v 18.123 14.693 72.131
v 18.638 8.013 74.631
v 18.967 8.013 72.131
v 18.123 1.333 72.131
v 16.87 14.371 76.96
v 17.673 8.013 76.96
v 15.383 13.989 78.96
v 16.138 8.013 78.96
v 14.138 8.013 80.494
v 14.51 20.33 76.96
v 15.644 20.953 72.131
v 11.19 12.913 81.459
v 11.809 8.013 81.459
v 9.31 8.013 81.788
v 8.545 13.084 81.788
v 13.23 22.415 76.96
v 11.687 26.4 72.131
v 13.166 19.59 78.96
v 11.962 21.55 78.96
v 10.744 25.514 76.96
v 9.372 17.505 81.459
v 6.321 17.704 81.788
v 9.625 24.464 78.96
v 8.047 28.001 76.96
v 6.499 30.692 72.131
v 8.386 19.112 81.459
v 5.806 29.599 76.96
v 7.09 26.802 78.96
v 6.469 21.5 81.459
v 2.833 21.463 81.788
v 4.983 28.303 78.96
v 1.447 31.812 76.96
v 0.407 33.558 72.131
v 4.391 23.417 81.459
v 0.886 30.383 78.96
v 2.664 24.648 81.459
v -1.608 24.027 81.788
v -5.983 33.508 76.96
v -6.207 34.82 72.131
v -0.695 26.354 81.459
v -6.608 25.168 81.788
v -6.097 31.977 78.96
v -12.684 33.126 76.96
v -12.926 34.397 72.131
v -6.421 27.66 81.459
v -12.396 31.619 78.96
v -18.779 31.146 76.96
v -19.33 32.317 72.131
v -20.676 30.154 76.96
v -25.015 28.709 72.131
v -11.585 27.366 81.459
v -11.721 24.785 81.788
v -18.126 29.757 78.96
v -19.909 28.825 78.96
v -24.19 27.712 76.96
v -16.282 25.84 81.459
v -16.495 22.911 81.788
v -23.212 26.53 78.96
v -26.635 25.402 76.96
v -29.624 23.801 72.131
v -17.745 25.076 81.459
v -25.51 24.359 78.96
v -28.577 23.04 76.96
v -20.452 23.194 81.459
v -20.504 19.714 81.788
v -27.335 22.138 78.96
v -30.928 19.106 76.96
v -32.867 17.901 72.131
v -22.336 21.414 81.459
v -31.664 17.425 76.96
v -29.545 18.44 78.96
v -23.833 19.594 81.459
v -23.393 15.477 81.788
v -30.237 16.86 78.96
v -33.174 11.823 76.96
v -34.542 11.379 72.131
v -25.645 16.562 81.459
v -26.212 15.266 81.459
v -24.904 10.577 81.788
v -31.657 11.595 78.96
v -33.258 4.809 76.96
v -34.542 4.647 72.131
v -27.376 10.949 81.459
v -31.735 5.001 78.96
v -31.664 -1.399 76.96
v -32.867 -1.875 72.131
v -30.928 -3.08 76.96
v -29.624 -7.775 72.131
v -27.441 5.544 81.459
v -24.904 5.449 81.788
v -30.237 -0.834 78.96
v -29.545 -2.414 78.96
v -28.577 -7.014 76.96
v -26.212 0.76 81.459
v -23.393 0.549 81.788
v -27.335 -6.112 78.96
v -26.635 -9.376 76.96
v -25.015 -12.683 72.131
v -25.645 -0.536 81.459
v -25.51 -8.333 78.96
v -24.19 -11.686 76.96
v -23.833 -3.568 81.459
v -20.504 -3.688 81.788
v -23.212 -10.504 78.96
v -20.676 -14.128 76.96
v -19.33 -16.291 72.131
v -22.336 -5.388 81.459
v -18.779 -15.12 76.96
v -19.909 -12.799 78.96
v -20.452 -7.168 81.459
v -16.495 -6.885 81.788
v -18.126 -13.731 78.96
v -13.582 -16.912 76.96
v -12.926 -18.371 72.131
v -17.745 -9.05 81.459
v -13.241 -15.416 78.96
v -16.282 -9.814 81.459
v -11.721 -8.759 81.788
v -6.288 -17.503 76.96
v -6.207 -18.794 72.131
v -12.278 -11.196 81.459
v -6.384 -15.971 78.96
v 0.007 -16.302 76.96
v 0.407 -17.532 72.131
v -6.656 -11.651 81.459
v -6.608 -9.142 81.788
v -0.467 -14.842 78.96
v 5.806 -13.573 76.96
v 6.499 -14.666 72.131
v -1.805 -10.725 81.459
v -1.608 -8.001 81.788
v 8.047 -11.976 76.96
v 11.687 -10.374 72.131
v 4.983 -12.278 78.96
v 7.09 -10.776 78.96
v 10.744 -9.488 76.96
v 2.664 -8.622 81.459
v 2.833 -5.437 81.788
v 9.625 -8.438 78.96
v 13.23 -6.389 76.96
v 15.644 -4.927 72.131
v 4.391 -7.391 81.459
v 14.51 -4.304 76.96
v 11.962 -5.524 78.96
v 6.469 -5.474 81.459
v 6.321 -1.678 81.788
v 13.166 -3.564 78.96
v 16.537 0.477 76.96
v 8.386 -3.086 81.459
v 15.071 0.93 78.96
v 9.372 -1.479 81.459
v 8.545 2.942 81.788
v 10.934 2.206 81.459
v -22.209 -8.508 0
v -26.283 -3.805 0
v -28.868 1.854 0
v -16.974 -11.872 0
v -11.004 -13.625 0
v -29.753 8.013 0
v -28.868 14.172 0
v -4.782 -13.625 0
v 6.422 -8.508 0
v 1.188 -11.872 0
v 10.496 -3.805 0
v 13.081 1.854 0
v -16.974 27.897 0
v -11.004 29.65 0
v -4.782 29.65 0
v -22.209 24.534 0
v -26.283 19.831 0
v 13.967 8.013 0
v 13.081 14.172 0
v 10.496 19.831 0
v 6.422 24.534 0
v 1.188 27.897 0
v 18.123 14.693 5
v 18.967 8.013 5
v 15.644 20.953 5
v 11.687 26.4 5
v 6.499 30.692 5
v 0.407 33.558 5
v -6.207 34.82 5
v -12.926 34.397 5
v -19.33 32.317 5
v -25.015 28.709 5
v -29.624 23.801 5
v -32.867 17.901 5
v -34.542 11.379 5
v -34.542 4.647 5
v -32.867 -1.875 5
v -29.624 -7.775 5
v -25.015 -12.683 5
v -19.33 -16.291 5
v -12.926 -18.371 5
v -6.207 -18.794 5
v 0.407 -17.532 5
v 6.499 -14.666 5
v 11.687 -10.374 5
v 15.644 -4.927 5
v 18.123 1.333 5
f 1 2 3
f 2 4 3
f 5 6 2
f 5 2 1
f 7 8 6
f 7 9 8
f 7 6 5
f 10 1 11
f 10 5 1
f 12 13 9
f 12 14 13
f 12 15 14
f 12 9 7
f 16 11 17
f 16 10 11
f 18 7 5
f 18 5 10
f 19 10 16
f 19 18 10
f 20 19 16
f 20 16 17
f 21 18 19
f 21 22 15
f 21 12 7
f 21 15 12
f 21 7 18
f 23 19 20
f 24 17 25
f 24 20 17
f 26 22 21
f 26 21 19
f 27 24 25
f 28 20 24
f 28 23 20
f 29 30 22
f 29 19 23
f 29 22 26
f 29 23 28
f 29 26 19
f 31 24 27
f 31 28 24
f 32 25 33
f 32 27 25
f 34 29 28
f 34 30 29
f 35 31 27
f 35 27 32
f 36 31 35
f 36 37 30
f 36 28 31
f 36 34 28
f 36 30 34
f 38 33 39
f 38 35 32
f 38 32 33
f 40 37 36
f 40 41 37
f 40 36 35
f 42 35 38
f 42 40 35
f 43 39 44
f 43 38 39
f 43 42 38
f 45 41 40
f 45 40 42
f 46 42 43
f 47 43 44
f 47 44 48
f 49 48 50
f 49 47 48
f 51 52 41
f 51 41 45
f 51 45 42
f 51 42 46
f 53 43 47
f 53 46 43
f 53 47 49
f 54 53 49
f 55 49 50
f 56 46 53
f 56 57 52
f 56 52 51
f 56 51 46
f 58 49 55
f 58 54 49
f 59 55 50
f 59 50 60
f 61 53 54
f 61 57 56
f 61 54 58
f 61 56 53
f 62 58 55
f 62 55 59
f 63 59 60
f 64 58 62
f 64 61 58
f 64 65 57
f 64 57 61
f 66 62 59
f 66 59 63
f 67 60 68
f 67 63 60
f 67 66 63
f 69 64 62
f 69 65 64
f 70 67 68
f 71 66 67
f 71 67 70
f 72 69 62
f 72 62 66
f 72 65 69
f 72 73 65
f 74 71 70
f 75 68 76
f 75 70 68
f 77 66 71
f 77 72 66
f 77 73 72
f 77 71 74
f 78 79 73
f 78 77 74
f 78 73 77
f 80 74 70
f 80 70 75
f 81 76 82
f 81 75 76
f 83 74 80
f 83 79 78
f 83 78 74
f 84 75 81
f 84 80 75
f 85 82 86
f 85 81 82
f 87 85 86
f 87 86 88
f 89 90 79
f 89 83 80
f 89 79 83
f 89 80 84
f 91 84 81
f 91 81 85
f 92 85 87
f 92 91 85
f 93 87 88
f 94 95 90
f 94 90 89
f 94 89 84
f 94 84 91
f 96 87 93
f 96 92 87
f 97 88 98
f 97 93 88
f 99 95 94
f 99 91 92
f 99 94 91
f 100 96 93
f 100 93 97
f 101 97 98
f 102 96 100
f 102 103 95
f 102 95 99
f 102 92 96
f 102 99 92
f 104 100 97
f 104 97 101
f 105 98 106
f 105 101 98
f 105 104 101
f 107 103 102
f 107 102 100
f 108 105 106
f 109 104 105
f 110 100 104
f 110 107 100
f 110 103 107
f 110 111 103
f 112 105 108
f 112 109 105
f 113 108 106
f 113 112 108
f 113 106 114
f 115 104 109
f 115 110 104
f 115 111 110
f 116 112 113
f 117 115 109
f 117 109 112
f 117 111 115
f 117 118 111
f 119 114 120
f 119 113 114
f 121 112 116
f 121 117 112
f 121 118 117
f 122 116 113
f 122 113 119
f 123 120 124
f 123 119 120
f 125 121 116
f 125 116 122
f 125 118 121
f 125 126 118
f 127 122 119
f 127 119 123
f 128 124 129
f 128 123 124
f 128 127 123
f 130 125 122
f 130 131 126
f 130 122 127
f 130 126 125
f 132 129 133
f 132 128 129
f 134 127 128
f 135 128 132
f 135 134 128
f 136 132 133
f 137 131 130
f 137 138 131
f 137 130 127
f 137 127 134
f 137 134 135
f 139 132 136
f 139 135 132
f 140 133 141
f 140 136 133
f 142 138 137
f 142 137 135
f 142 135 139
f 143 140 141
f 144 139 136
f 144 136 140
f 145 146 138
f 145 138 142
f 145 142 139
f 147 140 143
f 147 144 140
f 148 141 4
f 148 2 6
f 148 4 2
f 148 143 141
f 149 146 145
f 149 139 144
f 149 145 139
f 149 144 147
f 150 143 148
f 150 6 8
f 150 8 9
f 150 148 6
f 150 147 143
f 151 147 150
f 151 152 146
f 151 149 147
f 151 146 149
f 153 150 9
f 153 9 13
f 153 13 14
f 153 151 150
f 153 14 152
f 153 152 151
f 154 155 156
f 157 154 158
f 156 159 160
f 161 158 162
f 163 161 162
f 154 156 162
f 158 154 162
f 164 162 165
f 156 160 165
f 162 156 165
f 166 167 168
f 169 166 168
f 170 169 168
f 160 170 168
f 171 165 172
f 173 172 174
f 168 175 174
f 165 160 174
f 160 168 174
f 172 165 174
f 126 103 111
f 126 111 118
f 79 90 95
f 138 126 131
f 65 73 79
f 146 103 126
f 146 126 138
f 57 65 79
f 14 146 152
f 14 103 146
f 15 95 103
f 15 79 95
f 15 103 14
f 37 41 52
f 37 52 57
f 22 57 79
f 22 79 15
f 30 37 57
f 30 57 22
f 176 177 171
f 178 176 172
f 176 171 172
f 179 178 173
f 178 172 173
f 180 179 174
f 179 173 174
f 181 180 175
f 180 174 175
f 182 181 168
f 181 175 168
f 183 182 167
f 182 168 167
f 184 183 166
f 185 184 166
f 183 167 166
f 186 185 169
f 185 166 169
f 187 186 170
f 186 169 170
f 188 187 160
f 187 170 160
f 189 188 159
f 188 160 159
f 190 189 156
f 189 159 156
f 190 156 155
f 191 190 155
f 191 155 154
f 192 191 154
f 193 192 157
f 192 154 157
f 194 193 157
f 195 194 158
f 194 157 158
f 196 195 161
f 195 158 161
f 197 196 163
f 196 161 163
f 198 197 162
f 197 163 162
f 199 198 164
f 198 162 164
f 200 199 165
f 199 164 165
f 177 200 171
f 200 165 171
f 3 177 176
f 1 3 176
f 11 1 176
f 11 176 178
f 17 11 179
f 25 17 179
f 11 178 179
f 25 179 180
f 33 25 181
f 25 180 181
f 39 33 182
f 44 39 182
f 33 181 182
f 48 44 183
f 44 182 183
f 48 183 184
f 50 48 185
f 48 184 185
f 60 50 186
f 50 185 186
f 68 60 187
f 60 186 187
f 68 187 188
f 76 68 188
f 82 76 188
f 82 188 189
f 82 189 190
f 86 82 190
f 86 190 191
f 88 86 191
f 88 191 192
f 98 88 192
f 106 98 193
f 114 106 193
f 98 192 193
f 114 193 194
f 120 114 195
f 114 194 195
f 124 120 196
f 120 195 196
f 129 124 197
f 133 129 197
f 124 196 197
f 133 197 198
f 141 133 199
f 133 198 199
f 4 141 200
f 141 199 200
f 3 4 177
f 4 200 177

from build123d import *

# Parameters (mm, degrees)
F0_R     = 26.859981
F1_DEPTH = 81.788
F2_R     = 9.656854
F3_SIZE  = 5


with BuildPart() as f1:
    # F0 (on Top) → F1 (new body)
    with BuildSketch(Plane.XY):
        with Locations((-7.893364, 8.01296)):
            Circle(F0_R)
    extrude(amount=F1_DEPTH)

    # F2
    f2_edges = [f1.edges().sort_by_distance(p)[0] for p in [
        (-34.753345, 8.01296, 81.788),
    ]]
    fillet(f2_edges, radius=F2_R)

    # F3
    f3_edges = [f1.edges().sort_by_distance(p)[0] for p in [
        (-34.753345, 8.01296, 0),
    ]]
    chamfer(f3_edges, length=F3_SIZE)


solid = f1.part
